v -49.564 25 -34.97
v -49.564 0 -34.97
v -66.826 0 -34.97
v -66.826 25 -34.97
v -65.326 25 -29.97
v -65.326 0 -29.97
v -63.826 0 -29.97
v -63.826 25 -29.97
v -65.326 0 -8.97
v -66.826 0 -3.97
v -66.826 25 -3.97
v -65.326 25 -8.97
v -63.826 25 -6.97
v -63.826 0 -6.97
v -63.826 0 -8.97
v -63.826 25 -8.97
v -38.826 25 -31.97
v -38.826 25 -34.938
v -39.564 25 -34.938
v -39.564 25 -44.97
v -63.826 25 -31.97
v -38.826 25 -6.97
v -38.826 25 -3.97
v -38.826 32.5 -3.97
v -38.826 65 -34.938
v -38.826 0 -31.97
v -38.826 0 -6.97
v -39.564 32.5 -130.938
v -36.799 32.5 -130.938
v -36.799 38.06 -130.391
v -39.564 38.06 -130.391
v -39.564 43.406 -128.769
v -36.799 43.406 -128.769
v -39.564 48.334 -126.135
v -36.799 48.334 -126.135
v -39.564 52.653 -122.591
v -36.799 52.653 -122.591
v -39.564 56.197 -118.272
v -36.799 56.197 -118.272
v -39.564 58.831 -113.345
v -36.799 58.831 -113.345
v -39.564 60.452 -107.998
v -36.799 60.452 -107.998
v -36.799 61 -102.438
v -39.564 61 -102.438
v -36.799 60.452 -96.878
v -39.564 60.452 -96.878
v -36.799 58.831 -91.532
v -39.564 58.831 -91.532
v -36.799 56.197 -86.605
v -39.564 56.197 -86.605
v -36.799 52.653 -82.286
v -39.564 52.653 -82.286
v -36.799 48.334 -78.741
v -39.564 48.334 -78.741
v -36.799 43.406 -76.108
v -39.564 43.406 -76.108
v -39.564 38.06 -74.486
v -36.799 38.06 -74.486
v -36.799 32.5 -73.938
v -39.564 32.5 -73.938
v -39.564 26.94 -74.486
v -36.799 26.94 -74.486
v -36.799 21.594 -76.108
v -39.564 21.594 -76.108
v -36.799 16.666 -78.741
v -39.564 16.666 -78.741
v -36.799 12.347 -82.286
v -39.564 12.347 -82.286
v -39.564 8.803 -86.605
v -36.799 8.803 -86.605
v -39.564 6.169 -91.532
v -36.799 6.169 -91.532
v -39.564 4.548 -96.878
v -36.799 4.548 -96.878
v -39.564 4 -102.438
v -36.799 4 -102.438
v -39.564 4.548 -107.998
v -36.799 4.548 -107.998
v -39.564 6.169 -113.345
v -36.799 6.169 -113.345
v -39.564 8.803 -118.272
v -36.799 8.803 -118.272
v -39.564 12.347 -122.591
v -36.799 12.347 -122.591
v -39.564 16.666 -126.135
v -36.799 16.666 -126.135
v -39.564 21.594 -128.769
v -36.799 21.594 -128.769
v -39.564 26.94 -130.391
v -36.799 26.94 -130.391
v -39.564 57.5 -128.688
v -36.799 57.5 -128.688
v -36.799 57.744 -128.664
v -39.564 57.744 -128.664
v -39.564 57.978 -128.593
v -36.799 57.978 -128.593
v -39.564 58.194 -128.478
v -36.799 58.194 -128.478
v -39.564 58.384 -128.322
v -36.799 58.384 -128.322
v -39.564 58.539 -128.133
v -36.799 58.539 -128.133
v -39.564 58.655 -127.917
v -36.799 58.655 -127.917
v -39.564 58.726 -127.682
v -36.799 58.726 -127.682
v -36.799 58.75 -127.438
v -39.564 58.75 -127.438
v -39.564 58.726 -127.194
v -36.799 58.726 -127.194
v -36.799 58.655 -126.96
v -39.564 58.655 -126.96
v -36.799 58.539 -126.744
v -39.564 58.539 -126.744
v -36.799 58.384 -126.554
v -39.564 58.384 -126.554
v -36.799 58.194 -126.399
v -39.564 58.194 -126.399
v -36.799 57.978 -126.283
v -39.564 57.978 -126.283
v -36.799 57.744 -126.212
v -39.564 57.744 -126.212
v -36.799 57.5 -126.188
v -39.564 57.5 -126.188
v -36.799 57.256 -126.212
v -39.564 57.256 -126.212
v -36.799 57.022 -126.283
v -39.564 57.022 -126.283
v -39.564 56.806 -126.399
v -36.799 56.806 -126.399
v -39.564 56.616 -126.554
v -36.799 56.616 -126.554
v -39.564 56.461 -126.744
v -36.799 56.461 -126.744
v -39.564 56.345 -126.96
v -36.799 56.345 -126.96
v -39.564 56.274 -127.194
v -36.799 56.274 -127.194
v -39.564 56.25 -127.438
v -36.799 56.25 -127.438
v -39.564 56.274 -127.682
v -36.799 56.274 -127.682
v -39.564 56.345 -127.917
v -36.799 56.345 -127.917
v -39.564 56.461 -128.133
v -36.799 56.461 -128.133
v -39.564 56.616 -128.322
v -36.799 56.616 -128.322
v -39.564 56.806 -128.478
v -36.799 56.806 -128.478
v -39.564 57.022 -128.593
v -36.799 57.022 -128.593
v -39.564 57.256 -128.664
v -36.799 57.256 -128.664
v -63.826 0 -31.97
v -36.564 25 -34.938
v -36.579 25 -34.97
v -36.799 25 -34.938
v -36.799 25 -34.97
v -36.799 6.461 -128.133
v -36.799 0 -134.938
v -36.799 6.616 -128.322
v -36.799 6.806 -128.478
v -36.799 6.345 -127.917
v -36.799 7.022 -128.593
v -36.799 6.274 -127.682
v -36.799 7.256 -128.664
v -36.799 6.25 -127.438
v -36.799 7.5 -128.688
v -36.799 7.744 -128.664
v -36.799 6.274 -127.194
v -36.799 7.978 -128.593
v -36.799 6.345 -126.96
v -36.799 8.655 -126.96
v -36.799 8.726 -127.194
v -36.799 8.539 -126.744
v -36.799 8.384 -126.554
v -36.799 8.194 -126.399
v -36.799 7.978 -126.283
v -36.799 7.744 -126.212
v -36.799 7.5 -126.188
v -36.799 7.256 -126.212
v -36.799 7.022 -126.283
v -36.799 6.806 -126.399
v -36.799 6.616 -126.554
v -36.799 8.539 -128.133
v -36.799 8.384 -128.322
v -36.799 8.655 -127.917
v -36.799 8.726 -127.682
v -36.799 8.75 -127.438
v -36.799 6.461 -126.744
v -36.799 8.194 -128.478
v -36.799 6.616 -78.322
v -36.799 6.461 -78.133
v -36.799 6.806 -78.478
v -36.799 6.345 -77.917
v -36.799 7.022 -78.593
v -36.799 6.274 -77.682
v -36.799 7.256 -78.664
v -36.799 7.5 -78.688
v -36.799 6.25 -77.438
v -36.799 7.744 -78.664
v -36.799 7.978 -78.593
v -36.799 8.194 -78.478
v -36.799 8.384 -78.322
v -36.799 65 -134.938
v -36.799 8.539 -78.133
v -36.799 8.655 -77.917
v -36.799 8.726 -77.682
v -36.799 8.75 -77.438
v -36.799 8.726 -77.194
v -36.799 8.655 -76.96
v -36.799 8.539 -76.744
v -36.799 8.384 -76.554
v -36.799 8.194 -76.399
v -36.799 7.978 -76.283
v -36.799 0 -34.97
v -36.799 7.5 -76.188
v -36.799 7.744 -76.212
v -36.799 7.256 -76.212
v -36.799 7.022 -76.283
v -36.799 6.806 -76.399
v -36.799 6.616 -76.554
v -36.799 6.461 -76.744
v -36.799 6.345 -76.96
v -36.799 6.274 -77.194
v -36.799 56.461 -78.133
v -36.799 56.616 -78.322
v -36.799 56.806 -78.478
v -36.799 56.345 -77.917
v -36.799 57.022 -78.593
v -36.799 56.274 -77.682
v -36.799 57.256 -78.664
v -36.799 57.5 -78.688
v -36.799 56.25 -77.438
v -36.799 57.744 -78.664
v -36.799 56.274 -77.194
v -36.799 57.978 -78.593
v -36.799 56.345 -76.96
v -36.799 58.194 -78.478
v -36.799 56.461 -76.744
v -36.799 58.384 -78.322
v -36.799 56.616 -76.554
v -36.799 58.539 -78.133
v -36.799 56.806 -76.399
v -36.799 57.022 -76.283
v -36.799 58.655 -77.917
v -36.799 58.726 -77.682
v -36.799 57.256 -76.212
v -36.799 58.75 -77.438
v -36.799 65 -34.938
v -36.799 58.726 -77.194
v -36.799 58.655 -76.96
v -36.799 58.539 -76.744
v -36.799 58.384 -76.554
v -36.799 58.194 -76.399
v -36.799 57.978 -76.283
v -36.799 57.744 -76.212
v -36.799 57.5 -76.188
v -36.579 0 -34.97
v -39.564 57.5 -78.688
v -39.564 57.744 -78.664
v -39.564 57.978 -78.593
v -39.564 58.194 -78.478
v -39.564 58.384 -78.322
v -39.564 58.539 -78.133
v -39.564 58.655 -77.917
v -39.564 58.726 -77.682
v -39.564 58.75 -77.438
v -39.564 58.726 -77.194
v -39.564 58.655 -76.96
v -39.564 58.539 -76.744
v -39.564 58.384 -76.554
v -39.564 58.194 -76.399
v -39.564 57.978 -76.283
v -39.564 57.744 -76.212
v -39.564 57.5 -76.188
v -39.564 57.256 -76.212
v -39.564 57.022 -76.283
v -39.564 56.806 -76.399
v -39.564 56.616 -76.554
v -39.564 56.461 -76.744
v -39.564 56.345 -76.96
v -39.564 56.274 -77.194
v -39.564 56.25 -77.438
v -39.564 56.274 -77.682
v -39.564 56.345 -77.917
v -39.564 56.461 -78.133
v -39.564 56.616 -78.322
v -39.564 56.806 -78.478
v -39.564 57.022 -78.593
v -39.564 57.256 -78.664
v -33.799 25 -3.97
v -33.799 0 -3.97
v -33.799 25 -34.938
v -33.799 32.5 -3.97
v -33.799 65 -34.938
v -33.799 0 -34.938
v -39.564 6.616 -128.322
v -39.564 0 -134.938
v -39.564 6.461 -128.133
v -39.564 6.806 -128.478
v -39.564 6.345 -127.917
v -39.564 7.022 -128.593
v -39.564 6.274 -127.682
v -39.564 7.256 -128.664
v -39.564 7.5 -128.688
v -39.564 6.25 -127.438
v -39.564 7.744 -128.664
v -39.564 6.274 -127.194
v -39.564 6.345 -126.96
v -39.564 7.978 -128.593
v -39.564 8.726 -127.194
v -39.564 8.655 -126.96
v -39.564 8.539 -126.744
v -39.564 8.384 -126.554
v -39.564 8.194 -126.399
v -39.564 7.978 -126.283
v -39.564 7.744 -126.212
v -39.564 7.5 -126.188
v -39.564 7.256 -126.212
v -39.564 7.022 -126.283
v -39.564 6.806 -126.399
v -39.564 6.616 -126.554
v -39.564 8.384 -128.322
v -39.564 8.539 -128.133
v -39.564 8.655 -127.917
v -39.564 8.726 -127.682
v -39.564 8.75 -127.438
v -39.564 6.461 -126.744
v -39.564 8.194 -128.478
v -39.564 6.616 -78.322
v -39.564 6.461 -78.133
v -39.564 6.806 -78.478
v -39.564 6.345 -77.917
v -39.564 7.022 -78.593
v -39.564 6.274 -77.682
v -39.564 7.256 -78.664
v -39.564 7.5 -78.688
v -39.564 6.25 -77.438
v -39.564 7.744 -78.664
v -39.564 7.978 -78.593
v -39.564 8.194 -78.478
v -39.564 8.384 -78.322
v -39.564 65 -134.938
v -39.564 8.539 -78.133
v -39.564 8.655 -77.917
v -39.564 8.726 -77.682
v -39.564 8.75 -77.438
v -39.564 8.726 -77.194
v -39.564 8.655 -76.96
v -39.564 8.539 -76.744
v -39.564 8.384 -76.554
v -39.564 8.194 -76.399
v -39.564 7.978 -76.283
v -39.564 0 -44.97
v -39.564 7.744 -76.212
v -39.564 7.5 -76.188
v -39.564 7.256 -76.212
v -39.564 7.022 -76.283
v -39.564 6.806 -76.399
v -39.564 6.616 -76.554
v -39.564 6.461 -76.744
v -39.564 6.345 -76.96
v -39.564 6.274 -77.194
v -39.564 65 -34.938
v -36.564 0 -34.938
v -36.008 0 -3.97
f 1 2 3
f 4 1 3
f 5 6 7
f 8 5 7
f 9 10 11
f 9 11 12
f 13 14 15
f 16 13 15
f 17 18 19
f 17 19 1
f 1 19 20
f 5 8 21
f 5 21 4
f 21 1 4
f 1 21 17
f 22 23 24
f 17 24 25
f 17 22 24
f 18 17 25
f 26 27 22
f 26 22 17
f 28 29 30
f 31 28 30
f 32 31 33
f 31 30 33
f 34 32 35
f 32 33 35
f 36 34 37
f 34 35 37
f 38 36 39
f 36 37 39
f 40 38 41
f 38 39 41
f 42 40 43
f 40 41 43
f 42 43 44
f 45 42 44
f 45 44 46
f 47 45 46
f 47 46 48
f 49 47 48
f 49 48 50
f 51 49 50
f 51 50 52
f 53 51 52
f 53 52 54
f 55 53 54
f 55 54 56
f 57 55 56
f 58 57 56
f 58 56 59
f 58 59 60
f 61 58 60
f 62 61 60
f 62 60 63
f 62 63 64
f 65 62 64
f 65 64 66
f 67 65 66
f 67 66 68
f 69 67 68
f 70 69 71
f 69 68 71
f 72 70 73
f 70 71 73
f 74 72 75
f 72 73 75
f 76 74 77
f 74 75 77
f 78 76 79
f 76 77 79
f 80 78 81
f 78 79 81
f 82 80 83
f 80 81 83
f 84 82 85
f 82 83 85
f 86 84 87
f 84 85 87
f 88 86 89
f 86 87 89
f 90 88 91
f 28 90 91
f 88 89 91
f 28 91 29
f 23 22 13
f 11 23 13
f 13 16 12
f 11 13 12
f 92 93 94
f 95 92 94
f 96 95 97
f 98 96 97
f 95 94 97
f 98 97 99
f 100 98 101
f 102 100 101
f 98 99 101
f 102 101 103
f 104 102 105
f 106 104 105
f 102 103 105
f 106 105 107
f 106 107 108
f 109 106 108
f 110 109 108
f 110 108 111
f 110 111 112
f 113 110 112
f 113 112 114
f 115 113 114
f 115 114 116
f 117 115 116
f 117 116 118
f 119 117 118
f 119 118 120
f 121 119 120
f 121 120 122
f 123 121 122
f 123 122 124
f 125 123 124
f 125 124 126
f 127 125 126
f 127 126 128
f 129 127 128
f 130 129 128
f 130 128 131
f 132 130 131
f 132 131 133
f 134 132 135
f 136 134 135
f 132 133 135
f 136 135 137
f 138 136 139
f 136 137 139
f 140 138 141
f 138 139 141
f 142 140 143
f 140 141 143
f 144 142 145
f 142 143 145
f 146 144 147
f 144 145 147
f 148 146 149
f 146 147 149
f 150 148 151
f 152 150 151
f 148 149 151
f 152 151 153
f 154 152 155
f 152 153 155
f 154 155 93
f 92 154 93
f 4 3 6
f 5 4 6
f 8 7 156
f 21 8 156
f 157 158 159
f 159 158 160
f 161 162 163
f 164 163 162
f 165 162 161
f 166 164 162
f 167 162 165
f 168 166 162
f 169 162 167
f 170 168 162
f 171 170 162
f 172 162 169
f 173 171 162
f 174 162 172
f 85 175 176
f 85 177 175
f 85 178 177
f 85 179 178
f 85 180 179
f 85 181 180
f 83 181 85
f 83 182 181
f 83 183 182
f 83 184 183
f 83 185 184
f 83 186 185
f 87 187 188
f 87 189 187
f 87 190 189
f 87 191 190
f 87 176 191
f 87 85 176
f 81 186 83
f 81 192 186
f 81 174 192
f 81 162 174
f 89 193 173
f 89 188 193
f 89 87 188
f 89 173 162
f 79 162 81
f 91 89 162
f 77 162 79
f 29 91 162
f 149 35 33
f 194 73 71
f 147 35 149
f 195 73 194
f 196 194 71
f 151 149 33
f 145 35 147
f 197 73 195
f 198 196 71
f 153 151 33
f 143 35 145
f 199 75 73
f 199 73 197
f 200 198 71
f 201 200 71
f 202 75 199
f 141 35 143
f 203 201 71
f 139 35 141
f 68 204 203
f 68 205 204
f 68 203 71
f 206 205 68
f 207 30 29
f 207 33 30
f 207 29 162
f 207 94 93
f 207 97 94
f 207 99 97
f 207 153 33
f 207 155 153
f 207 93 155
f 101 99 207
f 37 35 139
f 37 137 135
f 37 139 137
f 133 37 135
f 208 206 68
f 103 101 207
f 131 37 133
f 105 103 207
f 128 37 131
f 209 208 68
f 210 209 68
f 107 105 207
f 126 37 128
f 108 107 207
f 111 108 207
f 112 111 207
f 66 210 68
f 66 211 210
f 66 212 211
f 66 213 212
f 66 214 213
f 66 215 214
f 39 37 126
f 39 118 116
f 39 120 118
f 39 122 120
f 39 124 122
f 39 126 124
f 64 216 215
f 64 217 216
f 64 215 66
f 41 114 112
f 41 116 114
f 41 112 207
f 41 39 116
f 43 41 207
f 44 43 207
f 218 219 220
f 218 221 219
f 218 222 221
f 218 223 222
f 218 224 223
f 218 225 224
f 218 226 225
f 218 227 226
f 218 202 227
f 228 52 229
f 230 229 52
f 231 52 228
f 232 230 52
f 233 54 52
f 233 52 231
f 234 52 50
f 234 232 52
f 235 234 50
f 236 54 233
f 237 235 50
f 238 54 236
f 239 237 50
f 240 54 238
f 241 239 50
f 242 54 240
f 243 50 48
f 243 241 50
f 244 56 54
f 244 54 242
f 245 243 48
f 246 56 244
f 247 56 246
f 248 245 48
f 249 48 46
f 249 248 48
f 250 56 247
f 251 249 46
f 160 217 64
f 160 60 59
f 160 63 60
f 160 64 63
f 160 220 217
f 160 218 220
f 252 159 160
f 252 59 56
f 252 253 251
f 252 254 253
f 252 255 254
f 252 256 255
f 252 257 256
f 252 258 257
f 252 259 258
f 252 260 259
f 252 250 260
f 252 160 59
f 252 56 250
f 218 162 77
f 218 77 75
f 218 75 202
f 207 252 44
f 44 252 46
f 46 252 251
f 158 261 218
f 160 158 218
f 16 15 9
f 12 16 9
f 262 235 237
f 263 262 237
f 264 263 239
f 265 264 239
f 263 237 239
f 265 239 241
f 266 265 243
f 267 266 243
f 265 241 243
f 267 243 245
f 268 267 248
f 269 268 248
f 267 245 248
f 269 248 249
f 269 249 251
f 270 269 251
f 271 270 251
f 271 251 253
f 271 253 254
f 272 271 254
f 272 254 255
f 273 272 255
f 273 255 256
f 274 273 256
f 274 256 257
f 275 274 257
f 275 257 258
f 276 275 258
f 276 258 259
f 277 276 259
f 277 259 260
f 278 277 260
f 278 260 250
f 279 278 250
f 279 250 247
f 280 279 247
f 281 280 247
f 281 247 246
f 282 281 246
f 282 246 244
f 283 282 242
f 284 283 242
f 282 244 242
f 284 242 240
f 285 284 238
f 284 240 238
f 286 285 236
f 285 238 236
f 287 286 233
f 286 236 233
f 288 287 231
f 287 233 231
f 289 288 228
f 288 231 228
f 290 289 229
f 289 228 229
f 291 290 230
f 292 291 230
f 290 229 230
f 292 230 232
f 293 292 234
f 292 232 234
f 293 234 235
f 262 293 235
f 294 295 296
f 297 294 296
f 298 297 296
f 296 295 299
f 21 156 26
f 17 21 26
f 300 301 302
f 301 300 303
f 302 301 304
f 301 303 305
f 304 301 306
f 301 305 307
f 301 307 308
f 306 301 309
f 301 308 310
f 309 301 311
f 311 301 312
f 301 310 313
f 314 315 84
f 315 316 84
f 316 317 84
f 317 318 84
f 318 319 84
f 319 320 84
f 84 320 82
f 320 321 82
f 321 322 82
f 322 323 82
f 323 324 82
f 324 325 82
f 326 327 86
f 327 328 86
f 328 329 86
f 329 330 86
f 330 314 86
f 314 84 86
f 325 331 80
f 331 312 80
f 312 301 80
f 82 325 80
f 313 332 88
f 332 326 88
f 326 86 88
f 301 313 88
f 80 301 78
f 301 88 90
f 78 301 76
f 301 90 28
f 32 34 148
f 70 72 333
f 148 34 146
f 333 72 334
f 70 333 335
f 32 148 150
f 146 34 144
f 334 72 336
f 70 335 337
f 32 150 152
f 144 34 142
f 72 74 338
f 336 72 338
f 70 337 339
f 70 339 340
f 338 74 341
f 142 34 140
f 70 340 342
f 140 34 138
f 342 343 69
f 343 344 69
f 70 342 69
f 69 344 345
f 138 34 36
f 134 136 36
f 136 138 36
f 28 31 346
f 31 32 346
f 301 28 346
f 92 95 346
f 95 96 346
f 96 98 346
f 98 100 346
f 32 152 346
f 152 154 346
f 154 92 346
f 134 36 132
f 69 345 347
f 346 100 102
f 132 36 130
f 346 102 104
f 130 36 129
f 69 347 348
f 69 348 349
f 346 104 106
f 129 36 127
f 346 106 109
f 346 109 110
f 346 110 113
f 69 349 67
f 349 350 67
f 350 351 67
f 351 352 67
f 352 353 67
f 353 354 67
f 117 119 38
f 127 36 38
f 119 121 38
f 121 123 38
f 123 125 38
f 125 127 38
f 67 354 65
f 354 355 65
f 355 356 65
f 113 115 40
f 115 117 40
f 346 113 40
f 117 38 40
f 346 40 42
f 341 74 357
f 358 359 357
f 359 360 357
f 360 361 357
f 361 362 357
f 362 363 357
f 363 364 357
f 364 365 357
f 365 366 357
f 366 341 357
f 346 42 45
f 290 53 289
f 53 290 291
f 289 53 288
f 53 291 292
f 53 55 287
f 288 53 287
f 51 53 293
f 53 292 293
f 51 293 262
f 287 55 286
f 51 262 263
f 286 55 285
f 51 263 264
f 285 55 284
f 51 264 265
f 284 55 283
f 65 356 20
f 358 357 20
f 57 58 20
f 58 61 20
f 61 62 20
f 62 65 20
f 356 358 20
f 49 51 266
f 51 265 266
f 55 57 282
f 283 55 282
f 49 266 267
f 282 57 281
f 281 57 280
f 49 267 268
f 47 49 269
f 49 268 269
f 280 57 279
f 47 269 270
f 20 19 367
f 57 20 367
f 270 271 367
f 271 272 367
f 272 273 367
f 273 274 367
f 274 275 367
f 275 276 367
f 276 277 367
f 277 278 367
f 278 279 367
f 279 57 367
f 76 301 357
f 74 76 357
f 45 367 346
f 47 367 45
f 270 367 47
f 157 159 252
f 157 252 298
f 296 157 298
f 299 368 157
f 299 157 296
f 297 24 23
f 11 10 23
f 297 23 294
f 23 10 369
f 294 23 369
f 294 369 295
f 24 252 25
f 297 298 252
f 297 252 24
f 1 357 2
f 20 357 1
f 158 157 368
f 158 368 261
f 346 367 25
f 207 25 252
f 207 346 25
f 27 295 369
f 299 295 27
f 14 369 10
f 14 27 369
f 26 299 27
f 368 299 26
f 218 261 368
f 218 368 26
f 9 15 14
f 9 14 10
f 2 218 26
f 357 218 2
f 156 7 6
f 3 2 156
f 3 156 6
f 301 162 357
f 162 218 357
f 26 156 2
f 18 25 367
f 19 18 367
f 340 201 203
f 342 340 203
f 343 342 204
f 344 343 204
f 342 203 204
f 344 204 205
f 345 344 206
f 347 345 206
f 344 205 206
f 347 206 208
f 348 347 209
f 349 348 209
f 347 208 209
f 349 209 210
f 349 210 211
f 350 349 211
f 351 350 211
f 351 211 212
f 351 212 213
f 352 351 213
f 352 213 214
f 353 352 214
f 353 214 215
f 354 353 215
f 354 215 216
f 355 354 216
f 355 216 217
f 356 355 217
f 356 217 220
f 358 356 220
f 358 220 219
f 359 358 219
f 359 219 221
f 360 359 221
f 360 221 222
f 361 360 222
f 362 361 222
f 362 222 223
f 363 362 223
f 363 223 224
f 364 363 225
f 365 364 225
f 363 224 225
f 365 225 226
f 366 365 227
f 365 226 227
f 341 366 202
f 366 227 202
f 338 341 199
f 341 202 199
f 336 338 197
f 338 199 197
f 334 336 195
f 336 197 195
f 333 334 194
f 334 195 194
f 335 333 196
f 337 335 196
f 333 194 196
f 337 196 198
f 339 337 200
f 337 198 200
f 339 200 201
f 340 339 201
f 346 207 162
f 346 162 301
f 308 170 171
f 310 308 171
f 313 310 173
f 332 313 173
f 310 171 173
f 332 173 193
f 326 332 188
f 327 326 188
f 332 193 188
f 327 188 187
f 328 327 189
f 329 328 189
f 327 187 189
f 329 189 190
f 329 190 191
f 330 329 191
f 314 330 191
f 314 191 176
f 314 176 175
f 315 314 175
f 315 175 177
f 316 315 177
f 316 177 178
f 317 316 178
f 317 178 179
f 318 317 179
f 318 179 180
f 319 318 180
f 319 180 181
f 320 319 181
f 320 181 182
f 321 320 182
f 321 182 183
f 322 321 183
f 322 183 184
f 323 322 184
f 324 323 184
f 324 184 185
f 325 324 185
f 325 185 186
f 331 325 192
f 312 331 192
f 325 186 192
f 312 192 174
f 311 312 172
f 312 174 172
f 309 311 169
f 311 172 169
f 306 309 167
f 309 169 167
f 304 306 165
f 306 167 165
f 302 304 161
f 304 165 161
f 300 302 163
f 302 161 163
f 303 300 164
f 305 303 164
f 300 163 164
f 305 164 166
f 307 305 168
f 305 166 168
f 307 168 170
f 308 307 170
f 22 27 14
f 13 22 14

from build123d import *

# Parameters (mm, degrees)
EXTRUDE_1_DEPTH      = 25
CUT_EXTRUDE_4_DEPTH  = 80.457942189
SKETCH_7_W           = 16.60831278
SKETCH_7_H           = 38.473598513
CUT_EXTRUDE_14_DEPTH = 80.457942189
SKETCH_8_W           = 5
SKETCH_8_H           = 30.968526609
EXTRUDE_2_DEPTH      = 25
SKETCH_9_W           = 2.765387297
SKETCH_9_H           = 65
EXTRUDE_3_DEPTH      = 100
SKETCH_10_W          = 5.026813651
SKETCH_10_H          = 30.968526609
EXTRUDE_4_DEPTH      = 40
CUT_EXTRUDE_15_DEPTH = 100
SKETCH_12_R          = 28.5
CUT_EXTRUDE_16_DEPTH = 100
SKETCH_13_R          = 1.25
CUT_EXTRUDE_17_DEPTH = 100
CHAMFER_1_SIZE       = 10


with BuildPart() as part:
    # Эскиз1 → Бобышка-Вытянуть1 (new body)
    with BuildSketch(Plane(origin=(0, 0, 0), x_dir=(1, 0, 0), z_dir=(0, 1, 0))):
        Polygon((-66.825757576, 34.969739794), (-66.825757576, 29.969739794), (-63.825757576, 29.969739794), (-63.825757576, 31.969739794), (-38.825757576, 31.969739794), (-38.825757576, 6.969739794), (-63.825757576, 6.969739794), (-63.825757576, 8.969739794), (-66.825757576, 8.969739794), (-66.825757576, 3.969739794), (-22.123470102, 3.969739794), (-36.579007505, 34.969739794), align=None)
    extrude(amount=EXTRUDE_1_DEPTH)

    # Эскиз3 → Вырез-Вытянуть4 (cut, through all)
    with BuildSketch(Plane.XZ):
        Polygon((-66.825757576, -3.969739794), (-65.325757576, -8.969739794), (-66.825757576, -8.969739794), align=None)
        Polygon((-66.825757576, -29.969739794), (-66.825757576, -34.969739794), (-65.325757576, -29.969739794), align=None)
    extrude(amount=-CUT_EXTRUDE_4_DEPTH, mode=Mode.SUBTRACT)

    # Эскиз7 → Вырез-Вытянуть14 (cut, through all)
    with BuildSketch(Plane(origin=(0, 0, 0), x_dir=(-1, 0, 0), z_dir=(0, -1, 0))):
        with Locations((27.703474463, 20.539743139)):
            Rectangle(SKETCH_7_W, SKETCH_7_H)
    extrude(amount=-CUT_EXTRUDE_14_DEPTH, mode=Mode.SUBTRACT)

    # Эскиз8 → Бобышка-Вытянуть2 (add)
    with BuildSketch(Plane(origin=(0, 0, 0), x_dir=(-1, 0, 0), z_dir=(0, -1, 0))):
        with Locations((36.298943925, 19.454003098)):
            Rectangle(SKETCH_8_W, SKETCH_8_H)
    extrude(amount=-EXTRUDE_2_DEPTH)

    # Эскиз9 → Бобышка-Вытянуть3 (add)
    with BuildSketch(Plane(origin=(0, 0, -34.938266403), x_dir=(-1, 0, 0), z_dir=(0, 0, -1))):
        with Locations((38.181637573, 32.5)):
            Rectangle(SKETCH_9_W, SKETCH_9_H)
    extrude(amount=EXTRUDE_3_DEPTH)

    # Эскиз10 → Бобышка-Вытянуть4 (add)
    with BuildSketch(Plane(origin=(0, 25, 0), x_dir=(1, 0, 0), z_dir=(0, 1, 0))):
        with Locations((-36.312350751, 19.454003098)):
            Rectangle(SKETCH_10_W, SKETCH_10_H)
    extrude(amount=EXTRUDE_4_DEPTH)

    # Эскиз11 → Вырез-Вытянуть15 (cut)
    with BuildSketch(Plane(origin=(-33.798943925, 0, 0), x_dir=(0, 0, -1), z_dir=(1, 0, 0))):
        Polygon((34.938266403, 65), (3.969739794, 32.5), (3.969739794, 65), align=None)
    extrude(amount=-CUT_EXTRUDE_15_DEPTH, mode=Mode.SUBTRACT)

    # Эскиз12 → Вырез-Вытянуть16 (cut)
    with BuildSketch(Plane(origin=(-36.798943925, 0, 0), x_dir=(0, 0, -1), z_dir=(1, 0, 0))):
        with Locations((102.438266403, 32.5)):
            Circle(SKETCH_12_R)
    extrude(amount=-CUT_EXTRUDE_16_DEPTH, mode=Mode.SUBTRACT)

    # Эскиз13 → Вырез-Вытянуть17 (cut)
    with BuildSketch(Plane(origin=(-36.798943925, 0, 0), x_dir=(0, 0, -1), z_dir=(1, 0, 0))):
        with Locations((77.438266403, 57.5)):
            Circle(SKETCH_13_R)
        with Locations((127.438266403, 57.5)):
            Circle(SKETCH_13_R)
        with Locations((127.438266403, 7.5)):
            Circle(SKETCH_13_R)
        with Locations((77.438266403, 7.5)):
            Circle(SKETCH_13_R)
    extrude(amount=-CUT_EXTRUDE_17_DEPTH, mode=Mode.SUBTRACT)

    # Фаска1
    chamfer_1_edges = [part.edges().sort_by_distance(p)[0] for p in [
        (-39.564331222, 12.5, -34.969739794),
    ]]
    chamfer(chamfer_1_edges, length=CHAMFER_1_SIZE)


solid = part.part
